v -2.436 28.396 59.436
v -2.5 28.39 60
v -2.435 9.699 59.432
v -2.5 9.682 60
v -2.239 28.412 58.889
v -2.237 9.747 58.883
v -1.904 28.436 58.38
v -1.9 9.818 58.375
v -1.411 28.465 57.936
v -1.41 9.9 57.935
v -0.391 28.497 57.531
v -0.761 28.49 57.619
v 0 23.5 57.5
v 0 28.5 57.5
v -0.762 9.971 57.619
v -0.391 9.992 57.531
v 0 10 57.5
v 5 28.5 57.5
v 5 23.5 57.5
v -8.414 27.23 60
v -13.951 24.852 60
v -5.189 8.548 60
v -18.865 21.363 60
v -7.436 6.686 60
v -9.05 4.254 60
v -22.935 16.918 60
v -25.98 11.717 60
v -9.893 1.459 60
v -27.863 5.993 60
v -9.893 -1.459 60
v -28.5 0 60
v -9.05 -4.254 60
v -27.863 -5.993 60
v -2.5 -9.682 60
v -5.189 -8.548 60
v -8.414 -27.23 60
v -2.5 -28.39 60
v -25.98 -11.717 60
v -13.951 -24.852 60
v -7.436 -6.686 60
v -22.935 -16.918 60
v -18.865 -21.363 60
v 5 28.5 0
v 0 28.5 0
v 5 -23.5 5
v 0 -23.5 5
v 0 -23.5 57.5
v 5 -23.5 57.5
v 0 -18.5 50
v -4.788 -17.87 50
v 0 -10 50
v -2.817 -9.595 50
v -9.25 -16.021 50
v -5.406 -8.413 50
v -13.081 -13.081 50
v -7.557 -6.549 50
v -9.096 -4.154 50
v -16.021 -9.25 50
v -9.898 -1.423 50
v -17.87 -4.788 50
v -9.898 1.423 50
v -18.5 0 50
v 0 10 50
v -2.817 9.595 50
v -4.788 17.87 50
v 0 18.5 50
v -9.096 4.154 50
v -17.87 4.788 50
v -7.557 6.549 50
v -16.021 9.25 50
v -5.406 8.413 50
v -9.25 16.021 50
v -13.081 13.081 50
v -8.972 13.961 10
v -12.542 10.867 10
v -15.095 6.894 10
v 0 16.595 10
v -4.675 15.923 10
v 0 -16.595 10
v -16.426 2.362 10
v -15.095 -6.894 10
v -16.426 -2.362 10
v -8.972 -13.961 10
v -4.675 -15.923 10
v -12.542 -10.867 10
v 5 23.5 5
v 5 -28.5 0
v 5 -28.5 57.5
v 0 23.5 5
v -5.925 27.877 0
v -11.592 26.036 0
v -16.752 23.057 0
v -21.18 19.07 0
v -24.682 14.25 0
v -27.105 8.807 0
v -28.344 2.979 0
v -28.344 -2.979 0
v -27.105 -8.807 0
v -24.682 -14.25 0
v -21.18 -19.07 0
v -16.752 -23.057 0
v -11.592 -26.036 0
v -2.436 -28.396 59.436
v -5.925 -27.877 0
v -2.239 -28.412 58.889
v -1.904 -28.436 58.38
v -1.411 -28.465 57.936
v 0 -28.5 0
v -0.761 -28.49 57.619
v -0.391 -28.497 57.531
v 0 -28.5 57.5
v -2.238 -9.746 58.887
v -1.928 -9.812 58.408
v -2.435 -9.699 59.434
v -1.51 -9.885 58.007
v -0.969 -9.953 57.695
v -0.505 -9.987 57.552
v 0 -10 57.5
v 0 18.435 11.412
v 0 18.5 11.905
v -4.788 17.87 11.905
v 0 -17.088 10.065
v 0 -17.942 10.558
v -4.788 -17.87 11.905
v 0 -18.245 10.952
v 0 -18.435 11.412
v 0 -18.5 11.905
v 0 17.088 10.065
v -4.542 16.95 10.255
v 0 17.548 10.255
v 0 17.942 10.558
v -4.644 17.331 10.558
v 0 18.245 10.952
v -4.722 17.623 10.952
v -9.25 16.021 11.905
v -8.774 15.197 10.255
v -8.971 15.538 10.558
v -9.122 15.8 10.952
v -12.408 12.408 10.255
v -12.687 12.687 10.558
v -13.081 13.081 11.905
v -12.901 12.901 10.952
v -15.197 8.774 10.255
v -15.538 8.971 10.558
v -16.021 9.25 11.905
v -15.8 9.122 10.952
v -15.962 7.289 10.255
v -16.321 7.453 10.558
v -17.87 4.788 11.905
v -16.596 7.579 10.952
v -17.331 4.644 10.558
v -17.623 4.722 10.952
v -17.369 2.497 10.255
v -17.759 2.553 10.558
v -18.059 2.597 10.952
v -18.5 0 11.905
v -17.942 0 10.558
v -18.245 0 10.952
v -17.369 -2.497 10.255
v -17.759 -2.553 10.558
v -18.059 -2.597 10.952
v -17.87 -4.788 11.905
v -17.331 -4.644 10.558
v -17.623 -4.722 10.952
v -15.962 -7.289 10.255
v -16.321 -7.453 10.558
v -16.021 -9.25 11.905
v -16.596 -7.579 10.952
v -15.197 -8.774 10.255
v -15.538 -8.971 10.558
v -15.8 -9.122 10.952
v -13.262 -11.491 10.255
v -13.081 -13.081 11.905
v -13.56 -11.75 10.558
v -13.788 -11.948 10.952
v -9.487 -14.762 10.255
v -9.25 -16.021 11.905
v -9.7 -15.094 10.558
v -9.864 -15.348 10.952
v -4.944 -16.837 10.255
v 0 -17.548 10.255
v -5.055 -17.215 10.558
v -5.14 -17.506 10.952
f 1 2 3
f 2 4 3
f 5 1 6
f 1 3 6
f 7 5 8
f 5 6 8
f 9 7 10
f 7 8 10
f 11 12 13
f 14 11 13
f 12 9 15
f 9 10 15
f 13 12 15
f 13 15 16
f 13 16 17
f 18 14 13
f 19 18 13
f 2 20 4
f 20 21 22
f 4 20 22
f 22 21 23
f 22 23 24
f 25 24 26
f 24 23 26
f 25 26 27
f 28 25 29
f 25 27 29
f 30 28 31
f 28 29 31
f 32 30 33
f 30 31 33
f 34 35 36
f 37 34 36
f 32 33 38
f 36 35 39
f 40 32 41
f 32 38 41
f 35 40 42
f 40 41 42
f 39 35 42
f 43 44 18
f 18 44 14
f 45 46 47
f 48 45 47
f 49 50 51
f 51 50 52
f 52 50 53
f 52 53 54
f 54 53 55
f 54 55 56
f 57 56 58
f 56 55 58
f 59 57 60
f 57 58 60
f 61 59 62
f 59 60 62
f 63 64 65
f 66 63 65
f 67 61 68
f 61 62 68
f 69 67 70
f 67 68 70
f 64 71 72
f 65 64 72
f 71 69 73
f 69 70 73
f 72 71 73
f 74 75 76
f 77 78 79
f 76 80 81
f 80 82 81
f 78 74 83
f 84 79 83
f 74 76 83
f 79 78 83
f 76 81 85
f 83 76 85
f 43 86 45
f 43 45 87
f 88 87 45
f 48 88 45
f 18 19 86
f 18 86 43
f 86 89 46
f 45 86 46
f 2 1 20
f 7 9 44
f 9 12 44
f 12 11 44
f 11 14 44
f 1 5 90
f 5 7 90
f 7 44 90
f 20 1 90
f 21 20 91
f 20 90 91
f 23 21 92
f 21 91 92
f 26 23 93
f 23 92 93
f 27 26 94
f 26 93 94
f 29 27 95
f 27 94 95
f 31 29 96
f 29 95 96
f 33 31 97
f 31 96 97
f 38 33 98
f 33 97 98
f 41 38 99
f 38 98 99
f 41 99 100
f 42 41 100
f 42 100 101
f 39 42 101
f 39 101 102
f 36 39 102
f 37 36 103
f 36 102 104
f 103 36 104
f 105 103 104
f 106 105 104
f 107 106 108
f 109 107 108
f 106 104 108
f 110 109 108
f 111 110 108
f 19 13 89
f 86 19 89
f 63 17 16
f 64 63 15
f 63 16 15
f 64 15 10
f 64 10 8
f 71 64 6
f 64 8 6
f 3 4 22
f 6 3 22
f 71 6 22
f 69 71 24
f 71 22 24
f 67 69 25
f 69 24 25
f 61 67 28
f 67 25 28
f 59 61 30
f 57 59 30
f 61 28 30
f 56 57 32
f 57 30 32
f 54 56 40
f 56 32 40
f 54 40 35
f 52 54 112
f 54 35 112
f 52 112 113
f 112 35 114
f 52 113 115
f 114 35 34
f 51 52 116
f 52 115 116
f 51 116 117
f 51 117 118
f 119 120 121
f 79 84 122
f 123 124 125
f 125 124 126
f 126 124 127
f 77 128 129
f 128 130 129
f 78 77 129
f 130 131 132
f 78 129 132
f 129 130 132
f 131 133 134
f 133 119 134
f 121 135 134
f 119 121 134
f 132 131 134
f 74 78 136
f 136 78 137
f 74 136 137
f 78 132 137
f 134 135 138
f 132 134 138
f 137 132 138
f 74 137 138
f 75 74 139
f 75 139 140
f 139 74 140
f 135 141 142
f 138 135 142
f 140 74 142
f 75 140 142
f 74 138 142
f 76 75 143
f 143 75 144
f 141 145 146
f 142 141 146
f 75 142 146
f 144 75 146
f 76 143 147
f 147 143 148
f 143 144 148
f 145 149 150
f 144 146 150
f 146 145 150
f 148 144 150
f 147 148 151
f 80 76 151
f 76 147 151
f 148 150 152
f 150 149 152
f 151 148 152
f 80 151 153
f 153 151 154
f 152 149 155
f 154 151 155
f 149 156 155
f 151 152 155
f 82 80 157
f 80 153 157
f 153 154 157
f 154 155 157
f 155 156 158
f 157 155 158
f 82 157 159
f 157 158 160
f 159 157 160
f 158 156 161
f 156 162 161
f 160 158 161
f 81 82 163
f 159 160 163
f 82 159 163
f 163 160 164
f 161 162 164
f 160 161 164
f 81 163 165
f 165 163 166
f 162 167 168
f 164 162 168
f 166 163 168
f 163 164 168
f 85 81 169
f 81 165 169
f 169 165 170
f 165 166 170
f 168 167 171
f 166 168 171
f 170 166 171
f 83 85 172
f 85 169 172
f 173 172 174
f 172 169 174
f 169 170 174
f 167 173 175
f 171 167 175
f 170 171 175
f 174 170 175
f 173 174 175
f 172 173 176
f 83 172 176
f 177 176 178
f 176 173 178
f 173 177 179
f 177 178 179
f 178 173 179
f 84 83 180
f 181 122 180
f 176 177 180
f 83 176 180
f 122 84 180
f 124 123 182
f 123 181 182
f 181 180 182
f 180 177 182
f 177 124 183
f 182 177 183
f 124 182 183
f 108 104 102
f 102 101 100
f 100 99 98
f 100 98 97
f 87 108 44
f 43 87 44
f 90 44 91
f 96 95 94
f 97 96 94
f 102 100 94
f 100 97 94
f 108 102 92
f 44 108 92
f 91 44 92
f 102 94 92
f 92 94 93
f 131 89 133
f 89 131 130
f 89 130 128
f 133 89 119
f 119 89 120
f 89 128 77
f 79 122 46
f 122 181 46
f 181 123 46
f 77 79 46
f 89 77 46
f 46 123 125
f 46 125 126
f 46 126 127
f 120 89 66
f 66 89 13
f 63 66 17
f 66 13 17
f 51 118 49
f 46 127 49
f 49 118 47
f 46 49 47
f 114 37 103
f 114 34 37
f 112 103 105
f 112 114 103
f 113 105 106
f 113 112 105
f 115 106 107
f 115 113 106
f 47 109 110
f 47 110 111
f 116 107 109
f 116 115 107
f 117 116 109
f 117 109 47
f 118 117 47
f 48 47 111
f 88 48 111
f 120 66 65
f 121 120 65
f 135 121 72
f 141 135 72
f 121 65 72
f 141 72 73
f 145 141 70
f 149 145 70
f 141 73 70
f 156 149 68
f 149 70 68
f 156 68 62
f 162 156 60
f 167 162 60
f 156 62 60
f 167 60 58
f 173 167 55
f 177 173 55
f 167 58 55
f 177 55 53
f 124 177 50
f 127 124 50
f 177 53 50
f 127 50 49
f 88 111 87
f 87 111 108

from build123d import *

# Parameters (mm, degrees)
F1_ANGLE_BACK = 90
F1_ANGLE      = 180
F2_R          = 2.5
F3_DEPTH      = 28.501
F3_DEPTH_BACK = 28.501
F4_R          = 1.905
F6_DEPTH      = 5


with BuildPart() as f1:
    # F0 (on Front) → F1 (revolve)
    with BuildSketch(Plane.XZ, mode=Mode.PRIVATE) as f1_sk:
        Polygon((-18.5, 0), (0, 0), (0, 10), (-18.5, 10), (-18.5, 50), (-10, 50), (-10, 60), (-18.5, 60), (-28.5, 60), (-28.5, 0), align=None)
    revolve(f1_sk.sketch.rotate(Axis((0, 0, 5), (0, 0, 1)), -F1_ANGLE_BACK), axis=Axis((0, 0, 5), (0, 0, 1)), revolution_arc=F1_ANGLE)

    # F2 (on Front) → F3 (cut, two sides)
    with BuildSketch(Plane.XZ) as f3_sk:
        with Locations((0, 60)):
            Circle(F2_R)
    extrude(amount=-F3_DEPTH, mode=Mode.SUBTRACT)
    extrude(f3_sk.sketch, amount=F3_DEPTH_BACK, mode=Mode.SUBTRACT)

    # F4
    f4_edges = [f1.edges().sort_by_distance(p)[0] for p in [
        (-18.5, 0, 10),
    ]]
    fillet(f4_edges, radius=F4_R)

    # F5 (on face) → F6 (join)
    with BuildSketch(Plane.YZ):
        Polygon((-23.5, 57.5), (-28.5, 57.5), (-28.5, 0), (28.5, 0), (28.5, 57.5), (23.5, 57.5), (23.5, 54.5), (23.5, 5), (-23.5, 5), (-23.5, 54.5), align=None)
    extrude(amount=F6_DEPTH)


solid = f1.part
